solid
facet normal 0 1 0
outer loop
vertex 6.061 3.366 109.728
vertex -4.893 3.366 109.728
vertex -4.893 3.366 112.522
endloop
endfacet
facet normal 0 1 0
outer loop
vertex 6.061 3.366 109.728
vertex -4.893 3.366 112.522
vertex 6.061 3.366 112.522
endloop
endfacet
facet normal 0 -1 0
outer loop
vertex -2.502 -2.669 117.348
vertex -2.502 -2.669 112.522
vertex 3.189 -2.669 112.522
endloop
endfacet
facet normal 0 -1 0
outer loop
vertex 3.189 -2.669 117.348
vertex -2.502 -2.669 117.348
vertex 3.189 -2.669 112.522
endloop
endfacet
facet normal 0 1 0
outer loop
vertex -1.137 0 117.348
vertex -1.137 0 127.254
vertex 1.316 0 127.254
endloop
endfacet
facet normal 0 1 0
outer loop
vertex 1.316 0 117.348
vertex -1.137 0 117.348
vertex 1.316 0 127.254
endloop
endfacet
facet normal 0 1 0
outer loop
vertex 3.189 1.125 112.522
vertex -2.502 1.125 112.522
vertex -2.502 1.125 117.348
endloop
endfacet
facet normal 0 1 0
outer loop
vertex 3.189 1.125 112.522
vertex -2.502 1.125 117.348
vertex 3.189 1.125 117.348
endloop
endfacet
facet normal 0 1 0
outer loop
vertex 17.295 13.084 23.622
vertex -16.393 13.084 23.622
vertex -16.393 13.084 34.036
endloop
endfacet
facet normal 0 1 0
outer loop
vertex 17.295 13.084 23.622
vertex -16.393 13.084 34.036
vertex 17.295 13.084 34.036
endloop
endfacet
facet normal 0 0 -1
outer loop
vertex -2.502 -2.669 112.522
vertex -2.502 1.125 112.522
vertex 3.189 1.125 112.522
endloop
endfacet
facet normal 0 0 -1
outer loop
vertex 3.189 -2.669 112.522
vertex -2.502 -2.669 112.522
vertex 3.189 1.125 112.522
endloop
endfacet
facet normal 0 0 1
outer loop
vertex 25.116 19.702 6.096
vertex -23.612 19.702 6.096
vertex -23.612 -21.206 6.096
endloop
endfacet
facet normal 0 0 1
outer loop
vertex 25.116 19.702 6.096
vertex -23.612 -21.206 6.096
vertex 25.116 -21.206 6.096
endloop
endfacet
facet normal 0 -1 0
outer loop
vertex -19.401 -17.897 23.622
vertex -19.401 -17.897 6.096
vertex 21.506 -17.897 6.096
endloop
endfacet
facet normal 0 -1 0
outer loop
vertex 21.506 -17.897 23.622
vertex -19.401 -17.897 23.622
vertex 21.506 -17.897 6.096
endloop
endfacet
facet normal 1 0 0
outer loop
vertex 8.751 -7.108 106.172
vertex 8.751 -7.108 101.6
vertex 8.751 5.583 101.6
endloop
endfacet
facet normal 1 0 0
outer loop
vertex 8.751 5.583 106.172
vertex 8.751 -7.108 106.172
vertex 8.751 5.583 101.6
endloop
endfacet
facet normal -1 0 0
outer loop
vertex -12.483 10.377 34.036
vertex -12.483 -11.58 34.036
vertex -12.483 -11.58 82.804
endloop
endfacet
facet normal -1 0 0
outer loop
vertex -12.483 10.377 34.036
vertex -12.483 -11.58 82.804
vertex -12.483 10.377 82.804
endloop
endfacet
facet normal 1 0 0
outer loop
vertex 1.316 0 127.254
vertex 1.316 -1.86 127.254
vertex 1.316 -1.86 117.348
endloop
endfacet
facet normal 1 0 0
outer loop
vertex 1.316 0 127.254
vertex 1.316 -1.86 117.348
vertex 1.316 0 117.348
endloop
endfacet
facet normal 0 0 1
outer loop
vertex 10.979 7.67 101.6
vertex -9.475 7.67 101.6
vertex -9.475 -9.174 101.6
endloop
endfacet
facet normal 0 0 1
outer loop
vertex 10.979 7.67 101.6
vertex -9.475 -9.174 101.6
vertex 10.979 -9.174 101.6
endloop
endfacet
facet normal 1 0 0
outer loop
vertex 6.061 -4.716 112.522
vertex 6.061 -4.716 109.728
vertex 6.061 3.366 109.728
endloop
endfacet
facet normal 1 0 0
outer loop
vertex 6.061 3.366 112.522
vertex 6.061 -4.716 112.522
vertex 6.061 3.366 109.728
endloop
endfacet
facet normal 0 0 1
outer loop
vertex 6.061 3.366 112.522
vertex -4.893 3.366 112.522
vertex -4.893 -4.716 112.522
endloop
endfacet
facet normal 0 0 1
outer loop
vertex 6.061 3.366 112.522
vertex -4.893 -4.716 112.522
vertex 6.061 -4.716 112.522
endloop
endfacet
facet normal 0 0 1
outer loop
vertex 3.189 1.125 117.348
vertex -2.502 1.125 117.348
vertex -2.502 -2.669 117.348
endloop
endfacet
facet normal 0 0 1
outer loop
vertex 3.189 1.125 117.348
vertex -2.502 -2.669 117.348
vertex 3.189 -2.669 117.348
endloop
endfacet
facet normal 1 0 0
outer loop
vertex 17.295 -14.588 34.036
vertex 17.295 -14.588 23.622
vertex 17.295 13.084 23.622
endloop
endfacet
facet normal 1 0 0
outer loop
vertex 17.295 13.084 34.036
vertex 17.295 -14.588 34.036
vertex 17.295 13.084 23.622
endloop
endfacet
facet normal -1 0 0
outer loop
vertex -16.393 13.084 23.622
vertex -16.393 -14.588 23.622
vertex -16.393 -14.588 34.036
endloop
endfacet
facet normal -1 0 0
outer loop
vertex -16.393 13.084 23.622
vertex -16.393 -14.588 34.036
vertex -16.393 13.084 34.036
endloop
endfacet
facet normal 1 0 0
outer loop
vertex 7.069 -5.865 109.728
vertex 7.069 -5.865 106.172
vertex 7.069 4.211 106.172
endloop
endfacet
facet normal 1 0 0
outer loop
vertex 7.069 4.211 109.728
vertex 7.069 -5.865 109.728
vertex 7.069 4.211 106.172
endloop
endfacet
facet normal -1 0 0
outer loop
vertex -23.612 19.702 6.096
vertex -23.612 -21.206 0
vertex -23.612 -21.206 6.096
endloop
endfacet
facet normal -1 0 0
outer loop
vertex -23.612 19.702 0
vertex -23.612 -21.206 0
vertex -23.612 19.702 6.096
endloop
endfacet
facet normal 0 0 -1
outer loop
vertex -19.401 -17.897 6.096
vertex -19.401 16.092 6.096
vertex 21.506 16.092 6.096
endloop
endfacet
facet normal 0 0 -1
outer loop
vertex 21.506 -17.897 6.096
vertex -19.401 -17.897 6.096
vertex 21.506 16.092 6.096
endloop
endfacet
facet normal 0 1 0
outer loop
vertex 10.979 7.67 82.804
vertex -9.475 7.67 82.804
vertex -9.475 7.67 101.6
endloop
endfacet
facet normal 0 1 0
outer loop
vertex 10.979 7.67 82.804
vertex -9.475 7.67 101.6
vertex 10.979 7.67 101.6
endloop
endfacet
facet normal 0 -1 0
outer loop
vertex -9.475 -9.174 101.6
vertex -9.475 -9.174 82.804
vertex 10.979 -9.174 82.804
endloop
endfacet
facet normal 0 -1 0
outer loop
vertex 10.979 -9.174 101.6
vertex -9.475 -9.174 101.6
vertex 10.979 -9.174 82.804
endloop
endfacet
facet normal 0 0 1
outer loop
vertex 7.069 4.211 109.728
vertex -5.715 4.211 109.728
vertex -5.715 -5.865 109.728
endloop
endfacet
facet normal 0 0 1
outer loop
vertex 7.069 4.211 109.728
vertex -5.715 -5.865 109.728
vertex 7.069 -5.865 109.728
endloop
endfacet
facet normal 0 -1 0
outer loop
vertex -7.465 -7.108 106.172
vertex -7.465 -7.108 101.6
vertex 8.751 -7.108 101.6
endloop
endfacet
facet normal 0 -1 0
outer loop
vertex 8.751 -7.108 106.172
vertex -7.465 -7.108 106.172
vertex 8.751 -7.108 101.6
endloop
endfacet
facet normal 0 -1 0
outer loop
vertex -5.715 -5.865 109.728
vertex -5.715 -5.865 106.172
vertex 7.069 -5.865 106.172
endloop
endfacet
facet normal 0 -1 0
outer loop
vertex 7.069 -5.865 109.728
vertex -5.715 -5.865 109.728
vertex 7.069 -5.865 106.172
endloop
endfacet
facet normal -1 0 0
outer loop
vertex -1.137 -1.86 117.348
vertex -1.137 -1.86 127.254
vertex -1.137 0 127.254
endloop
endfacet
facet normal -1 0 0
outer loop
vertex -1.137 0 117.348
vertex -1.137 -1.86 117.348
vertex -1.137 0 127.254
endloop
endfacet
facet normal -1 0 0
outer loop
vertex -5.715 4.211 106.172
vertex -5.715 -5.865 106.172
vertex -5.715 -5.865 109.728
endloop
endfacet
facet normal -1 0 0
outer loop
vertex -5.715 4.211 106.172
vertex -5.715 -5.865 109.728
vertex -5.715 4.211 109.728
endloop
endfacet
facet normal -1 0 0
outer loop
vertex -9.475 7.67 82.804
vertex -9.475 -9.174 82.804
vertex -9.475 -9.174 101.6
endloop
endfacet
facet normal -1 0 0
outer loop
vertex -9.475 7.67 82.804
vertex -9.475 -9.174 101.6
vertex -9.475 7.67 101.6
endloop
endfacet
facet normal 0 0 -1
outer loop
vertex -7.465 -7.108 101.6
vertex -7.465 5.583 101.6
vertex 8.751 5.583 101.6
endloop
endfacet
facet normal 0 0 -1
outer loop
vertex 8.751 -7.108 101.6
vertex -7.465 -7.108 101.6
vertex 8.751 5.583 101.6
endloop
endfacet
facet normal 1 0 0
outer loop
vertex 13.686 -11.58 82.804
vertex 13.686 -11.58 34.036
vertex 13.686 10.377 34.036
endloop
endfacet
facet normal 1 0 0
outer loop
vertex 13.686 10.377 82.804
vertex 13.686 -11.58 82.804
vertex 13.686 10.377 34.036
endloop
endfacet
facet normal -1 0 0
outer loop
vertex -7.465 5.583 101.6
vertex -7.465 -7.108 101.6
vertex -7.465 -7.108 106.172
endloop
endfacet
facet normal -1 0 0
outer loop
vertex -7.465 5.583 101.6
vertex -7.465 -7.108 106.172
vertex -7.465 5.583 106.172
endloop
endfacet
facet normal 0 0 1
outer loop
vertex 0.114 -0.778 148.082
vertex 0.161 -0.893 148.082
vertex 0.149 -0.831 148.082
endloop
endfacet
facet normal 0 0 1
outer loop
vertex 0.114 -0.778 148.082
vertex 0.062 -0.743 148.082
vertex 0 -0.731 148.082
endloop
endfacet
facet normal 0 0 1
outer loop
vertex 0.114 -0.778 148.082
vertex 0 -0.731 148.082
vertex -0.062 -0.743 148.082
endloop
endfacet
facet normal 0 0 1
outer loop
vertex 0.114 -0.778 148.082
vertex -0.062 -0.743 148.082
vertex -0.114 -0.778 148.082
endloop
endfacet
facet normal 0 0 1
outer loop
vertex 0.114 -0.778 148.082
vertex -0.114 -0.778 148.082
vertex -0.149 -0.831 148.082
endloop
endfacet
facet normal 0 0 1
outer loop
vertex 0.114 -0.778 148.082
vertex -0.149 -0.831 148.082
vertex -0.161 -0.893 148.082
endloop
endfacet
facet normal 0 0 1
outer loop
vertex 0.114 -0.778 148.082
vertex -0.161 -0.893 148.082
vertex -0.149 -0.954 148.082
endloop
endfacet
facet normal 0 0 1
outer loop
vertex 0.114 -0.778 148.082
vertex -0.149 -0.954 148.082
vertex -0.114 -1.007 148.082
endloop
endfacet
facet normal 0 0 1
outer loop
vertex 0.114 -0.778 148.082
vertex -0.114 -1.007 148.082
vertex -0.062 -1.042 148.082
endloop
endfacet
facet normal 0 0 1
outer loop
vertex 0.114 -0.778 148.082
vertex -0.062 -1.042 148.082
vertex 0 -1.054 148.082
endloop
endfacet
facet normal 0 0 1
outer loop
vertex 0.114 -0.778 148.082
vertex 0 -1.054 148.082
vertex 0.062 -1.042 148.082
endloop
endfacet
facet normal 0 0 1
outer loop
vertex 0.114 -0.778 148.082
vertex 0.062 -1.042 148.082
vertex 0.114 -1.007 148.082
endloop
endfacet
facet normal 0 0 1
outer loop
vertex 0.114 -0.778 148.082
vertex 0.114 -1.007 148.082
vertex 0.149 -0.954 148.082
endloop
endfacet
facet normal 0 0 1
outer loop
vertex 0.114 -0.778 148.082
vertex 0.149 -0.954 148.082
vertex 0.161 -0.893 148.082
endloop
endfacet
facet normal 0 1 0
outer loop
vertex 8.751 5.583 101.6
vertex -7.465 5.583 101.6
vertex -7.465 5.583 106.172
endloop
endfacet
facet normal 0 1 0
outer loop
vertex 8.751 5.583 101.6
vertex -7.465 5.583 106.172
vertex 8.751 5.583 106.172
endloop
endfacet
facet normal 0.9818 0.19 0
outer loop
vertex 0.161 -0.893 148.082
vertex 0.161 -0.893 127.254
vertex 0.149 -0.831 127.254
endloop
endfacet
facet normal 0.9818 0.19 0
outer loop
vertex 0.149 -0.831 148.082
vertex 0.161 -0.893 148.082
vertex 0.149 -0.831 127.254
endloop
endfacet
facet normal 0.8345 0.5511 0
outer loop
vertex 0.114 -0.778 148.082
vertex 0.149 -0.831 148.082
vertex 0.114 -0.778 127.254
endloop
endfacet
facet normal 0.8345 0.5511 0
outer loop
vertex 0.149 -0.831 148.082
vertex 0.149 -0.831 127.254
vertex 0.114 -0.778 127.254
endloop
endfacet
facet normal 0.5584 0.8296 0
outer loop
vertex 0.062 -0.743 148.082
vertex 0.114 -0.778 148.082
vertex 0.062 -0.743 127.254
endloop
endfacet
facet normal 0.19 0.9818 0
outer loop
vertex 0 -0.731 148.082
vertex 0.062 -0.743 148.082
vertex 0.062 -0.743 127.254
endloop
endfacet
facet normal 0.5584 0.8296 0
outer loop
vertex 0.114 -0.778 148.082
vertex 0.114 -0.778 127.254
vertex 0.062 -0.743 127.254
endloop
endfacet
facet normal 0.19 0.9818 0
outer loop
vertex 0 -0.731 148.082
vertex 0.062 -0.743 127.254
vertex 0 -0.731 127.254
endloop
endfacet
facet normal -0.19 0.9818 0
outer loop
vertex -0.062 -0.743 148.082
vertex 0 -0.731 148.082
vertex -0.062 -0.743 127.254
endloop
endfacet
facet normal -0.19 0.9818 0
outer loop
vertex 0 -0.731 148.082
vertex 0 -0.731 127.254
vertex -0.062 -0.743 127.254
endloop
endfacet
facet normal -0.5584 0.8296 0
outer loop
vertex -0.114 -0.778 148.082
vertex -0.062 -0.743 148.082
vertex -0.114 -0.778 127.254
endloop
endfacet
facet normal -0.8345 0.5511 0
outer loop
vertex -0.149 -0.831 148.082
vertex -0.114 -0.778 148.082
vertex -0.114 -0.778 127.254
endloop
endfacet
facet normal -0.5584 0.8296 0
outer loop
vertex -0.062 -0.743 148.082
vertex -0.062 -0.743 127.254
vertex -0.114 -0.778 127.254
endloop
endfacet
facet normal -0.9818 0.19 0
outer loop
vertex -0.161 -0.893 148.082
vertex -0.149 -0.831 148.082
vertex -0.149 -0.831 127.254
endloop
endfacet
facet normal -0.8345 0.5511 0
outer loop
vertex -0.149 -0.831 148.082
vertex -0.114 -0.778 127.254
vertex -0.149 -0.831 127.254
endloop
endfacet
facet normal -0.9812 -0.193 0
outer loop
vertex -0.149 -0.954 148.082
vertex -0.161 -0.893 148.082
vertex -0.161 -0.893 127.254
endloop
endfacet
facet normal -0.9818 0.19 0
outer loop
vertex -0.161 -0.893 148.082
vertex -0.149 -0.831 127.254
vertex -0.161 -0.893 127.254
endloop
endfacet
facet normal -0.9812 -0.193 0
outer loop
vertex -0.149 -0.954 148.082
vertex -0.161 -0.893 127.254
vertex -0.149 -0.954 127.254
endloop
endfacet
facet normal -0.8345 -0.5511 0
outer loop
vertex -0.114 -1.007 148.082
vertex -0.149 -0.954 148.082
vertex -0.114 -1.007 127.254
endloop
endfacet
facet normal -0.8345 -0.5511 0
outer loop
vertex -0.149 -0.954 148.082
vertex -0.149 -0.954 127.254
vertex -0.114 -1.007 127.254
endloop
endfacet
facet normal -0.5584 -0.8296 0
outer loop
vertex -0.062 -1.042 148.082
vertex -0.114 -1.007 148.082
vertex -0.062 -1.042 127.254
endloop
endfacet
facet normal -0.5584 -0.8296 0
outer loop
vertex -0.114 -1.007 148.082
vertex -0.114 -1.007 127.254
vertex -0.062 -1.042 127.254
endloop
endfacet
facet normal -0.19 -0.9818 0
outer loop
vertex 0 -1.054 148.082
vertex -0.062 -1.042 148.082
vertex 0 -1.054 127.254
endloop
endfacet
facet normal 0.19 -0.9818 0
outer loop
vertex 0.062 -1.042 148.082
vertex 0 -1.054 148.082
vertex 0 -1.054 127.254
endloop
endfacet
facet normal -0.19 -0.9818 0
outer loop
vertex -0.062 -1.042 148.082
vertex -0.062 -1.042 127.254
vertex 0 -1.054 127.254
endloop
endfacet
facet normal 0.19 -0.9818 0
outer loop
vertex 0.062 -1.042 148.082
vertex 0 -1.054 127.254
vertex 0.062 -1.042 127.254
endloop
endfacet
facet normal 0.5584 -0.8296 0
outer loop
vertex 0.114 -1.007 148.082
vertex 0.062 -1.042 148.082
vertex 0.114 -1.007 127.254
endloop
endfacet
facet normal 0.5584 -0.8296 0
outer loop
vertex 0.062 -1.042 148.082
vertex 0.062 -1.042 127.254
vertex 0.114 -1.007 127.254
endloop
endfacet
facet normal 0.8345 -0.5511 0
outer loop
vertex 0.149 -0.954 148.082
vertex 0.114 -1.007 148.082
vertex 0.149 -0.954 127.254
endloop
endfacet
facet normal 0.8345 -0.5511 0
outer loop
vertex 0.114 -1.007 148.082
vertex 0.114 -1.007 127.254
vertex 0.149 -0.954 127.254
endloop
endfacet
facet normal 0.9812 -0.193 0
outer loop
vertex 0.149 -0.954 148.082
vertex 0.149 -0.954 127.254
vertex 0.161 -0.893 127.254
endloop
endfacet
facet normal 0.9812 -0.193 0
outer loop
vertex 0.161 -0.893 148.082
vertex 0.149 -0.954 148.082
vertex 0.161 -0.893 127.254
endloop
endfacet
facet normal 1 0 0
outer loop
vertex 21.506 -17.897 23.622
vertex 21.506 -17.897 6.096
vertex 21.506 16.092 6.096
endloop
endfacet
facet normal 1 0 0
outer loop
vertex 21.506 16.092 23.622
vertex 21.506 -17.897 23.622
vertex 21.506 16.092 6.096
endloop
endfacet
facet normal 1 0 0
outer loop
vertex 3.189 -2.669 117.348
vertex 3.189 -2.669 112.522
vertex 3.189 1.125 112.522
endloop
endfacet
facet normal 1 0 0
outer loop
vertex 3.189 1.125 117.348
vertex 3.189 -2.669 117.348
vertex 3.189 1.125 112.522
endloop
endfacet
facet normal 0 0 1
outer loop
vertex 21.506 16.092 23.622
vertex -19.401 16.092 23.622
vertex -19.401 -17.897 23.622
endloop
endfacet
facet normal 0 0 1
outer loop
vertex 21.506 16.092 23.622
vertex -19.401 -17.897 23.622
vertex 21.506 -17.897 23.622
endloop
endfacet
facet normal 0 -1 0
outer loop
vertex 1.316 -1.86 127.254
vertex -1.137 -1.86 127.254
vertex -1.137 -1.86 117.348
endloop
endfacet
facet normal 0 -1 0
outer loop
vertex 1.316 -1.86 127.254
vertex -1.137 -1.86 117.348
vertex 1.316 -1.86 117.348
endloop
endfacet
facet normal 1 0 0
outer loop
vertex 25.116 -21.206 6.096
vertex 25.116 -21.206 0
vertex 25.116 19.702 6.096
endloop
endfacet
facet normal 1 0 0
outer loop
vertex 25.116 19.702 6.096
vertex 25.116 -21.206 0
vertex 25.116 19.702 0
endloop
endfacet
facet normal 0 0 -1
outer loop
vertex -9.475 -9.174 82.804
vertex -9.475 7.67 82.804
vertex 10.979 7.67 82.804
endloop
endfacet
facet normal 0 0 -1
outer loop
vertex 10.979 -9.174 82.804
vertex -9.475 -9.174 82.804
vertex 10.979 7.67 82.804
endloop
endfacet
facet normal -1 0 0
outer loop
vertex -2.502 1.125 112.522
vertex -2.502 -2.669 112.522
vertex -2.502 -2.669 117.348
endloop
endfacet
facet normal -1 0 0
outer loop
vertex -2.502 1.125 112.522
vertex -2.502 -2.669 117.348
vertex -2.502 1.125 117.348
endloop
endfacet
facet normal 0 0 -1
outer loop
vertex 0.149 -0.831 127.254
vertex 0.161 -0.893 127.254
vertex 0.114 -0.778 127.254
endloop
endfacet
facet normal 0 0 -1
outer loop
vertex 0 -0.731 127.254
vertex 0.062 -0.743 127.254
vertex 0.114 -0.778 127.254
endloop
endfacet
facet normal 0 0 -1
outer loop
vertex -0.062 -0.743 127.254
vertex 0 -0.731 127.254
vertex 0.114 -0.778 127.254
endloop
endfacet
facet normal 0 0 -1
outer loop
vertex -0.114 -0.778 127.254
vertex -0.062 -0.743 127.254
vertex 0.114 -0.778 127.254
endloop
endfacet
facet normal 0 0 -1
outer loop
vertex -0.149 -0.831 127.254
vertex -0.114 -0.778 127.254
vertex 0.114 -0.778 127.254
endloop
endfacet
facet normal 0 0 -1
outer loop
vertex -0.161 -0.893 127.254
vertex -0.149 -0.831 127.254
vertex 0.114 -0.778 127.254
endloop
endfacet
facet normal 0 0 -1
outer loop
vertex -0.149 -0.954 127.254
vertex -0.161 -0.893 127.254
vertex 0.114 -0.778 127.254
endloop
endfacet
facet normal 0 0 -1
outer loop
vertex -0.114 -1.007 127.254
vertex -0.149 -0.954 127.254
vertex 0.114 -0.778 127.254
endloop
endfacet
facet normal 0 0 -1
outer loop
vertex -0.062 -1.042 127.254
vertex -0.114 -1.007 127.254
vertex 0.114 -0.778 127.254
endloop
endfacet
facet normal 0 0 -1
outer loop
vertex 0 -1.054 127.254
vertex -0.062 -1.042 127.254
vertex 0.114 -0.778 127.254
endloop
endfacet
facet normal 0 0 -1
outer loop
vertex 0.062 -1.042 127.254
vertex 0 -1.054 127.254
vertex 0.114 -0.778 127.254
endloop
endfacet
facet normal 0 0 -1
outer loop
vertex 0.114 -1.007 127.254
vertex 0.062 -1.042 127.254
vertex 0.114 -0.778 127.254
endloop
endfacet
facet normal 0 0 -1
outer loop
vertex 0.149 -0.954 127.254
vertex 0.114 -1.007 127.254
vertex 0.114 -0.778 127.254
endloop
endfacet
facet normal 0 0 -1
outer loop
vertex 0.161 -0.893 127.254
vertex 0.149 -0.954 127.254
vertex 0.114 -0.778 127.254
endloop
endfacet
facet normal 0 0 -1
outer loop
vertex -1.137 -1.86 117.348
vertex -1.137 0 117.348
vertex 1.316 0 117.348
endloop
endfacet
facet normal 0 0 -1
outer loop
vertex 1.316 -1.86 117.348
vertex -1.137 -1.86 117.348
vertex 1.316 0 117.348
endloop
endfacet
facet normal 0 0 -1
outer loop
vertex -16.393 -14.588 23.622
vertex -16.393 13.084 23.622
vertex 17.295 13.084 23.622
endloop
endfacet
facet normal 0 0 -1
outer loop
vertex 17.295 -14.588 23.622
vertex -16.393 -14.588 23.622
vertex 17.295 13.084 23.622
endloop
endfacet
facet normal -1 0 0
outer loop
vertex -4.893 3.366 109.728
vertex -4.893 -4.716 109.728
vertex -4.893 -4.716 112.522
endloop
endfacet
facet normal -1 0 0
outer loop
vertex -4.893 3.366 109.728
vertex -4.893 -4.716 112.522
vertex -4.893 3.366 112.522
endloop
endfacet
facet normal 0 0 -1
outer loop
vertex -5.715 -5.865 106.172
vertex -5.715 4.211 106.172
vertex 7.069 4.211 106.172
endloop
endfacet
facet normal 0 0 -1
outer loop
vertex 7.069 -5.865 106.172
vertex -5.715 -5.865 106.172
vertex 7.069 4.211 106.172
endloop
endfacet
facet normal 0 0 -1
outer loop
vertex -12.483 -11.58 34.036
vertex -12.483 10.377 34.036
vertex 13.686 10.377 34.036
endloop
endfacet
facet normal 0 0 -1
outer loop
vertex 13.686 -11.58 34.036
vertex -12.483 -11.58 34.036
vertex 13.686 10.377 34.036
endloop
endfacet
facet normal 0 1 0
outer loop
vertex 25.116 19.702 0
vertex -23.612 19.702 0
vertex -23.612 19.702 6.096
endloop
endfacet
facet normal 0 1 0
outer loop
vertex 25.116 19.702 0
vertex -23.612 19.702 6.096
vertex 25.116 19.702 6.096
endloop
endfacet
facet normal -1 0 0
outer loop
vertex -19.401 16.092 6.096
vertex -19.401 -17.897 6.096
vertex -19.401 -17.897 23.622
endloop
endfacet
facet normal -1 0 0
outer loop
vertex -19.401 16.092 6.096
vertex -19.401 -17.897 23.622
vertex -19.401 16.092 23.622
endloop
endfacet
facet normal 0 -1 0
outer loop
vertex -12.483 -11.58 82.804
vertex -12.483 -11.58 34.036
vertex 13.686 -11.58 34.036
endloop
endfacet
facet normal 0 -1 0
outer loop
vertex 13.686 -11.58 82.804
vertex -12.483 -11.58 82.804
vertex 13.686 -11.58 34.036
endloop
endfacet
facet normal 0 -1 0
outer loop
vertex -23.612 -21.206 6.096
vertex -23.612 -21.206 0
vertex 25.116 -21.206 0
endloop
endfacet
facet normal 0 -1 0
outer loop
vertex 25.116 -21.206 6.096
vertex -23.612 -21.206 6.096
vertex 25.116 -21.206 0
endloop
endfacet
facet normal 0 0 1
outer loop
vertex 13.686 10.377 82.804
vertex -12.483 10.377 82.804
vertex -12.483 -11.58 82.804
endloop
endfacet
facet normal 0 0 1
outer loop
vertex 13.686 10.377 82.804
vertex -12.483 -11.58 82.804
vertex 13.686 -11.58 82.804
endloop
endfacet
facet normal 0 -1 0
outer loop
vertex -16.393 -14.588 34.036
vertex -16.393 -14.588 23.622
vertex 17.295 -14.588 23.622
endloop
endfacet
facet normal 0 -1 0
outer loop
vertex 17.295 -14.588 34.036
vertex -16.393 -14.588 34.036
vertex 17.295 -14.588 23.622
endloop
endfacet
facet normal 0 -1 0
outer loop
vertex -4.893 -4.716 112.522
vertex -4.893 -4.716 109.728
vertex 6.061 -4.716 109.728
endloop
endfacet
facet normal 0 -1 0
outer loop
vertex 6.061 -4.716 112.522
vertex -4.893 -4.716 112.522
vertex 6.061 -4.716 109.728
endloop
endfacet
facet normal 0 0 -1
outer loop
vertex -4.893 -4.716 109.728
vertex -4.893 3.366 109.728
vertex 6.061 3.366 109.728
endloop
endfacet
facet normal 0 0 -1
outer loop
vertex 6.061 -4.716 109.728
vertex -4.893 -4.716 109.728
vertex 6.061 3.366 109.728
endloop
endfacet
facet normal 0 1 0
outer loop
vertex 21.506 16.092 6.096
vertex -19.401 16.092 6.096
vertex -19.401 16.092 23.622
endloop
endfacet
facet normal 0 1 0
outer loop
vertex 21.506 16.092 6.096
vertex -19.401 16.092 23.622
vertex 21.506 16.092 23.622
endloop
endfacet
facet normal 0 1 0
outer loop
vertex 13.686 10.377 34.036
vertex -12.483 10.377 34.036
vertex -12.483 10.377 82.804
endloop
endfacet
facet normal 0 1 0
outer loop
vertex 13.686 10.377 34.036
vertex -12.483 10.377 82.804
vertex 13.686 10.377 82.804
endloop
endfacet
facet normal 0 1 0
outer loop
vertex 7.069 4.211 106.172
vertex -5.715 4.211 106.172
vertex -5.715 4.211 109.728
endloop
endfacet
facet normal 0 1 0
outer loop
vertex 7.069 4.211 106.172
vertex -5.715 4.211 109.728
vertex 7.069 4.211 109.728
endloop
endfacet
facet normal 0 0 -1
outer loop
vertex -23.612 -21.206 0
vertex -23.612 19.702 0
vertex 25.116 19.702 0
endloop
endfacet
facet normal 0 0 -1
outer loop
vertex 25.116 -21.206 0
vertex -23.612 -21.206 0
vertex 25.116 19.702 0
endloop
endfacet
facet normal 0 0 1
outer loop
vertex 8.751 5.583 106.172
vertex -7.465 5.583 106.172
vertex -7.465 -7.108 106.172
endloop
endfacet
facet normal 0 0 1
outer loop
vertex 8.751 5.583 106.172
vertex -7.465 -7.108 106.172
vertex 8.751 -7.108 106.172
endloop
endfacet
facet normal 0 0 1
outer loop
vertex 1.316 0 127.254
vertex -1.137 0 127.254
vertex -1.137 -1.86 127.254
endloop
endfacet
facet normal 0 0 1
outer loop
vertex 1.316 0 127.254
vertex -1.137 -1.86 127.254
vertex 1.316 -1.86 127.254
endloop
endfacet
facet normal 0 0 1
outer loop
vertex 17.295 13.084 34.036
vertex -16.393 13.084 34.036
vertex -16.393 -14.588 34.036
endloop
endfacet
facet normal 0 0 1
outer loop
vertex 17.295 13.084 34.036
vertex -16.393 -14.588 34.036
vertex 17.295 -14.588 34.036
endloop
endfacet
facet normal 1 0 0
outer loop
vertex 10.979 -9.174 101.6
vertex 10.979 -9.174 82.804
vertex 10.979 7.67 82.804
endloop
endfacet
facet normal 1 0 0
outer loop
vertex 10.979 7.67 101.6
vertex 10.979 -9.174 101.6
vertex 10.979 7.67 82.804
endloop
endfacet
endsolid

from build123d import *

# Parameters (mm, degrees)
F0_W      = 48.727892
F0_H      = 40.907368
F1_DEPTH  = 6.096
F2_W      = 40.907368
F2_H      = 33.989211
F3_DEPTH  = 17.526
F4_W      = 33.688422
F4_H      = 27.672633
F5_DEPTH  = 10.414
F6_W      = 26.168683
F6_H      = 21.957632
F7_DEPTH  = 48.768
F8_W      = 20.453684
F8_H      = 16.844212
F9_DEPTH  = 18.796
F10_W     = 16.216566
F10_H     = 12.691229
F11_DEPTH = 4.572
F12_W     = 12.783553
F12_H     = 10.076448
F13_DEPTH = 3.556
F14_W     = 10.95355
F14_H     = 8.082231
F15_DEPTH = 2.794
F16_W     = 5.690988
F16_H     = 3.793992
F17_DEPTH = 4.826
F18_W     = 2.453818
F18_H     = 1.859568
F19_DEPTH = 9.906
F21_R     = 0.161496
F22_DEPTH = 20.828


with BuildPart() as f1:
    # F0 (on Top) → F1 (new body)
    with BuildSketch(Plane.XY):
        with Locations((0.751972, -0.751974)):
            Rectangle(F0_W, F0_H)
    extrude(amount=F1_DEPTH)


with BuildPart() as f3:
    # F2 (on face) → F3 (new body)
    with BuildSketch(Plane.XY.offset(6.096)):
        with Locations((1.052763, -0.902368)):
            Rectangle(F2_W, F2_H)
    extrude(amount=F3_DEPTH)


with BuildPart() as f5:
    # F4 (on face) → F5 (new body)
    with BuildSketch(Plane.XY.offset(23.622)):
        with Locations((0.451183, -0.751974)):
            Rectangle(F4_W, F4_H)
    extrude(amount=F5_DEPTH)


with BuildPart() as f7:
    # F6 (on face) → F7 (new body)
    with BuildSketch(Plane.XY.offset(34.036)):
        with Locations((0.601578, -0.601579)):
            Rectangle(F6_W, F6_H)
    extrude(amount=F7_DEPTH)


with BuildPart() as f9:
    # F8 (on face) → F9 (new body)
    with BuildSketch(Plane.XY.offset(82.804)):
        with Locations((0.751973, -0.751974)):
            Rectangle(F8_W, F8_H)
    extrude(amount=F9_DEPTH)


with BuildPart() as f11:
    # F10 (on face) → F11 (new body)
    with BuildSketch(Plane.XY.offset(101.6)):
        with Locations((0.643044, -0.762294)):
            Rectangle(F10_W, F10_H)
    extrude(amount=F11_DEPTH)


with BuildPart() as f13:
    # F12 (on face) → F13 (new body)
    with BuildSketch(Plane.XY.offset(106.172)):
        with Locations((0.676776, -0.827171)):
            Rectangle(F12_W, F12_H)
    extrude(amount=F13_DEPTH)


with BuildPart() as f15:
    # F14 (on face) → F15 (new body)
    with BuildSketch(Plane.XY.offset(109.728)):
        with Locations((0.584138, -0.674785)):
            Rectangle(F14_W, F14_H)
    extrude(amount=F15_DEPTH)


with BuildPart() as f17:
    # F16 (on face) → F17 (new body)
    with BuildSketch(Plane.XY.offset(112.522)):
        with Locations((0.343883, -0.772364)):
            Rectangle(F16_W, F16_H)
    extrude(amount=F17_DEPTH)


with BuildPart() as f19:
    # F18 (on face) → F19 (new body)
    with BuildSketch(Plane.XY.offset(117.348)):
        with Locations((0.089556, -0.929784)):
            Rectangle(F18_W, F18_H)
    extrude(amount=F19_DEPTH)


with BuildPart() as f22:
    # F21 (on face) → F22 (new body)
    with BuildSketch(Plane.XY.offset(127.254)):
        with Locations((0, -0.892676)):
            Circle(F21_R)
    extrude(amount=F22_DEPTH)


solid = Compound([f1.part, f3.part, f5.part, f7.part, f9.part, f11.part, f13.part, f15.part, f17.part, f19.part, f22.part])
